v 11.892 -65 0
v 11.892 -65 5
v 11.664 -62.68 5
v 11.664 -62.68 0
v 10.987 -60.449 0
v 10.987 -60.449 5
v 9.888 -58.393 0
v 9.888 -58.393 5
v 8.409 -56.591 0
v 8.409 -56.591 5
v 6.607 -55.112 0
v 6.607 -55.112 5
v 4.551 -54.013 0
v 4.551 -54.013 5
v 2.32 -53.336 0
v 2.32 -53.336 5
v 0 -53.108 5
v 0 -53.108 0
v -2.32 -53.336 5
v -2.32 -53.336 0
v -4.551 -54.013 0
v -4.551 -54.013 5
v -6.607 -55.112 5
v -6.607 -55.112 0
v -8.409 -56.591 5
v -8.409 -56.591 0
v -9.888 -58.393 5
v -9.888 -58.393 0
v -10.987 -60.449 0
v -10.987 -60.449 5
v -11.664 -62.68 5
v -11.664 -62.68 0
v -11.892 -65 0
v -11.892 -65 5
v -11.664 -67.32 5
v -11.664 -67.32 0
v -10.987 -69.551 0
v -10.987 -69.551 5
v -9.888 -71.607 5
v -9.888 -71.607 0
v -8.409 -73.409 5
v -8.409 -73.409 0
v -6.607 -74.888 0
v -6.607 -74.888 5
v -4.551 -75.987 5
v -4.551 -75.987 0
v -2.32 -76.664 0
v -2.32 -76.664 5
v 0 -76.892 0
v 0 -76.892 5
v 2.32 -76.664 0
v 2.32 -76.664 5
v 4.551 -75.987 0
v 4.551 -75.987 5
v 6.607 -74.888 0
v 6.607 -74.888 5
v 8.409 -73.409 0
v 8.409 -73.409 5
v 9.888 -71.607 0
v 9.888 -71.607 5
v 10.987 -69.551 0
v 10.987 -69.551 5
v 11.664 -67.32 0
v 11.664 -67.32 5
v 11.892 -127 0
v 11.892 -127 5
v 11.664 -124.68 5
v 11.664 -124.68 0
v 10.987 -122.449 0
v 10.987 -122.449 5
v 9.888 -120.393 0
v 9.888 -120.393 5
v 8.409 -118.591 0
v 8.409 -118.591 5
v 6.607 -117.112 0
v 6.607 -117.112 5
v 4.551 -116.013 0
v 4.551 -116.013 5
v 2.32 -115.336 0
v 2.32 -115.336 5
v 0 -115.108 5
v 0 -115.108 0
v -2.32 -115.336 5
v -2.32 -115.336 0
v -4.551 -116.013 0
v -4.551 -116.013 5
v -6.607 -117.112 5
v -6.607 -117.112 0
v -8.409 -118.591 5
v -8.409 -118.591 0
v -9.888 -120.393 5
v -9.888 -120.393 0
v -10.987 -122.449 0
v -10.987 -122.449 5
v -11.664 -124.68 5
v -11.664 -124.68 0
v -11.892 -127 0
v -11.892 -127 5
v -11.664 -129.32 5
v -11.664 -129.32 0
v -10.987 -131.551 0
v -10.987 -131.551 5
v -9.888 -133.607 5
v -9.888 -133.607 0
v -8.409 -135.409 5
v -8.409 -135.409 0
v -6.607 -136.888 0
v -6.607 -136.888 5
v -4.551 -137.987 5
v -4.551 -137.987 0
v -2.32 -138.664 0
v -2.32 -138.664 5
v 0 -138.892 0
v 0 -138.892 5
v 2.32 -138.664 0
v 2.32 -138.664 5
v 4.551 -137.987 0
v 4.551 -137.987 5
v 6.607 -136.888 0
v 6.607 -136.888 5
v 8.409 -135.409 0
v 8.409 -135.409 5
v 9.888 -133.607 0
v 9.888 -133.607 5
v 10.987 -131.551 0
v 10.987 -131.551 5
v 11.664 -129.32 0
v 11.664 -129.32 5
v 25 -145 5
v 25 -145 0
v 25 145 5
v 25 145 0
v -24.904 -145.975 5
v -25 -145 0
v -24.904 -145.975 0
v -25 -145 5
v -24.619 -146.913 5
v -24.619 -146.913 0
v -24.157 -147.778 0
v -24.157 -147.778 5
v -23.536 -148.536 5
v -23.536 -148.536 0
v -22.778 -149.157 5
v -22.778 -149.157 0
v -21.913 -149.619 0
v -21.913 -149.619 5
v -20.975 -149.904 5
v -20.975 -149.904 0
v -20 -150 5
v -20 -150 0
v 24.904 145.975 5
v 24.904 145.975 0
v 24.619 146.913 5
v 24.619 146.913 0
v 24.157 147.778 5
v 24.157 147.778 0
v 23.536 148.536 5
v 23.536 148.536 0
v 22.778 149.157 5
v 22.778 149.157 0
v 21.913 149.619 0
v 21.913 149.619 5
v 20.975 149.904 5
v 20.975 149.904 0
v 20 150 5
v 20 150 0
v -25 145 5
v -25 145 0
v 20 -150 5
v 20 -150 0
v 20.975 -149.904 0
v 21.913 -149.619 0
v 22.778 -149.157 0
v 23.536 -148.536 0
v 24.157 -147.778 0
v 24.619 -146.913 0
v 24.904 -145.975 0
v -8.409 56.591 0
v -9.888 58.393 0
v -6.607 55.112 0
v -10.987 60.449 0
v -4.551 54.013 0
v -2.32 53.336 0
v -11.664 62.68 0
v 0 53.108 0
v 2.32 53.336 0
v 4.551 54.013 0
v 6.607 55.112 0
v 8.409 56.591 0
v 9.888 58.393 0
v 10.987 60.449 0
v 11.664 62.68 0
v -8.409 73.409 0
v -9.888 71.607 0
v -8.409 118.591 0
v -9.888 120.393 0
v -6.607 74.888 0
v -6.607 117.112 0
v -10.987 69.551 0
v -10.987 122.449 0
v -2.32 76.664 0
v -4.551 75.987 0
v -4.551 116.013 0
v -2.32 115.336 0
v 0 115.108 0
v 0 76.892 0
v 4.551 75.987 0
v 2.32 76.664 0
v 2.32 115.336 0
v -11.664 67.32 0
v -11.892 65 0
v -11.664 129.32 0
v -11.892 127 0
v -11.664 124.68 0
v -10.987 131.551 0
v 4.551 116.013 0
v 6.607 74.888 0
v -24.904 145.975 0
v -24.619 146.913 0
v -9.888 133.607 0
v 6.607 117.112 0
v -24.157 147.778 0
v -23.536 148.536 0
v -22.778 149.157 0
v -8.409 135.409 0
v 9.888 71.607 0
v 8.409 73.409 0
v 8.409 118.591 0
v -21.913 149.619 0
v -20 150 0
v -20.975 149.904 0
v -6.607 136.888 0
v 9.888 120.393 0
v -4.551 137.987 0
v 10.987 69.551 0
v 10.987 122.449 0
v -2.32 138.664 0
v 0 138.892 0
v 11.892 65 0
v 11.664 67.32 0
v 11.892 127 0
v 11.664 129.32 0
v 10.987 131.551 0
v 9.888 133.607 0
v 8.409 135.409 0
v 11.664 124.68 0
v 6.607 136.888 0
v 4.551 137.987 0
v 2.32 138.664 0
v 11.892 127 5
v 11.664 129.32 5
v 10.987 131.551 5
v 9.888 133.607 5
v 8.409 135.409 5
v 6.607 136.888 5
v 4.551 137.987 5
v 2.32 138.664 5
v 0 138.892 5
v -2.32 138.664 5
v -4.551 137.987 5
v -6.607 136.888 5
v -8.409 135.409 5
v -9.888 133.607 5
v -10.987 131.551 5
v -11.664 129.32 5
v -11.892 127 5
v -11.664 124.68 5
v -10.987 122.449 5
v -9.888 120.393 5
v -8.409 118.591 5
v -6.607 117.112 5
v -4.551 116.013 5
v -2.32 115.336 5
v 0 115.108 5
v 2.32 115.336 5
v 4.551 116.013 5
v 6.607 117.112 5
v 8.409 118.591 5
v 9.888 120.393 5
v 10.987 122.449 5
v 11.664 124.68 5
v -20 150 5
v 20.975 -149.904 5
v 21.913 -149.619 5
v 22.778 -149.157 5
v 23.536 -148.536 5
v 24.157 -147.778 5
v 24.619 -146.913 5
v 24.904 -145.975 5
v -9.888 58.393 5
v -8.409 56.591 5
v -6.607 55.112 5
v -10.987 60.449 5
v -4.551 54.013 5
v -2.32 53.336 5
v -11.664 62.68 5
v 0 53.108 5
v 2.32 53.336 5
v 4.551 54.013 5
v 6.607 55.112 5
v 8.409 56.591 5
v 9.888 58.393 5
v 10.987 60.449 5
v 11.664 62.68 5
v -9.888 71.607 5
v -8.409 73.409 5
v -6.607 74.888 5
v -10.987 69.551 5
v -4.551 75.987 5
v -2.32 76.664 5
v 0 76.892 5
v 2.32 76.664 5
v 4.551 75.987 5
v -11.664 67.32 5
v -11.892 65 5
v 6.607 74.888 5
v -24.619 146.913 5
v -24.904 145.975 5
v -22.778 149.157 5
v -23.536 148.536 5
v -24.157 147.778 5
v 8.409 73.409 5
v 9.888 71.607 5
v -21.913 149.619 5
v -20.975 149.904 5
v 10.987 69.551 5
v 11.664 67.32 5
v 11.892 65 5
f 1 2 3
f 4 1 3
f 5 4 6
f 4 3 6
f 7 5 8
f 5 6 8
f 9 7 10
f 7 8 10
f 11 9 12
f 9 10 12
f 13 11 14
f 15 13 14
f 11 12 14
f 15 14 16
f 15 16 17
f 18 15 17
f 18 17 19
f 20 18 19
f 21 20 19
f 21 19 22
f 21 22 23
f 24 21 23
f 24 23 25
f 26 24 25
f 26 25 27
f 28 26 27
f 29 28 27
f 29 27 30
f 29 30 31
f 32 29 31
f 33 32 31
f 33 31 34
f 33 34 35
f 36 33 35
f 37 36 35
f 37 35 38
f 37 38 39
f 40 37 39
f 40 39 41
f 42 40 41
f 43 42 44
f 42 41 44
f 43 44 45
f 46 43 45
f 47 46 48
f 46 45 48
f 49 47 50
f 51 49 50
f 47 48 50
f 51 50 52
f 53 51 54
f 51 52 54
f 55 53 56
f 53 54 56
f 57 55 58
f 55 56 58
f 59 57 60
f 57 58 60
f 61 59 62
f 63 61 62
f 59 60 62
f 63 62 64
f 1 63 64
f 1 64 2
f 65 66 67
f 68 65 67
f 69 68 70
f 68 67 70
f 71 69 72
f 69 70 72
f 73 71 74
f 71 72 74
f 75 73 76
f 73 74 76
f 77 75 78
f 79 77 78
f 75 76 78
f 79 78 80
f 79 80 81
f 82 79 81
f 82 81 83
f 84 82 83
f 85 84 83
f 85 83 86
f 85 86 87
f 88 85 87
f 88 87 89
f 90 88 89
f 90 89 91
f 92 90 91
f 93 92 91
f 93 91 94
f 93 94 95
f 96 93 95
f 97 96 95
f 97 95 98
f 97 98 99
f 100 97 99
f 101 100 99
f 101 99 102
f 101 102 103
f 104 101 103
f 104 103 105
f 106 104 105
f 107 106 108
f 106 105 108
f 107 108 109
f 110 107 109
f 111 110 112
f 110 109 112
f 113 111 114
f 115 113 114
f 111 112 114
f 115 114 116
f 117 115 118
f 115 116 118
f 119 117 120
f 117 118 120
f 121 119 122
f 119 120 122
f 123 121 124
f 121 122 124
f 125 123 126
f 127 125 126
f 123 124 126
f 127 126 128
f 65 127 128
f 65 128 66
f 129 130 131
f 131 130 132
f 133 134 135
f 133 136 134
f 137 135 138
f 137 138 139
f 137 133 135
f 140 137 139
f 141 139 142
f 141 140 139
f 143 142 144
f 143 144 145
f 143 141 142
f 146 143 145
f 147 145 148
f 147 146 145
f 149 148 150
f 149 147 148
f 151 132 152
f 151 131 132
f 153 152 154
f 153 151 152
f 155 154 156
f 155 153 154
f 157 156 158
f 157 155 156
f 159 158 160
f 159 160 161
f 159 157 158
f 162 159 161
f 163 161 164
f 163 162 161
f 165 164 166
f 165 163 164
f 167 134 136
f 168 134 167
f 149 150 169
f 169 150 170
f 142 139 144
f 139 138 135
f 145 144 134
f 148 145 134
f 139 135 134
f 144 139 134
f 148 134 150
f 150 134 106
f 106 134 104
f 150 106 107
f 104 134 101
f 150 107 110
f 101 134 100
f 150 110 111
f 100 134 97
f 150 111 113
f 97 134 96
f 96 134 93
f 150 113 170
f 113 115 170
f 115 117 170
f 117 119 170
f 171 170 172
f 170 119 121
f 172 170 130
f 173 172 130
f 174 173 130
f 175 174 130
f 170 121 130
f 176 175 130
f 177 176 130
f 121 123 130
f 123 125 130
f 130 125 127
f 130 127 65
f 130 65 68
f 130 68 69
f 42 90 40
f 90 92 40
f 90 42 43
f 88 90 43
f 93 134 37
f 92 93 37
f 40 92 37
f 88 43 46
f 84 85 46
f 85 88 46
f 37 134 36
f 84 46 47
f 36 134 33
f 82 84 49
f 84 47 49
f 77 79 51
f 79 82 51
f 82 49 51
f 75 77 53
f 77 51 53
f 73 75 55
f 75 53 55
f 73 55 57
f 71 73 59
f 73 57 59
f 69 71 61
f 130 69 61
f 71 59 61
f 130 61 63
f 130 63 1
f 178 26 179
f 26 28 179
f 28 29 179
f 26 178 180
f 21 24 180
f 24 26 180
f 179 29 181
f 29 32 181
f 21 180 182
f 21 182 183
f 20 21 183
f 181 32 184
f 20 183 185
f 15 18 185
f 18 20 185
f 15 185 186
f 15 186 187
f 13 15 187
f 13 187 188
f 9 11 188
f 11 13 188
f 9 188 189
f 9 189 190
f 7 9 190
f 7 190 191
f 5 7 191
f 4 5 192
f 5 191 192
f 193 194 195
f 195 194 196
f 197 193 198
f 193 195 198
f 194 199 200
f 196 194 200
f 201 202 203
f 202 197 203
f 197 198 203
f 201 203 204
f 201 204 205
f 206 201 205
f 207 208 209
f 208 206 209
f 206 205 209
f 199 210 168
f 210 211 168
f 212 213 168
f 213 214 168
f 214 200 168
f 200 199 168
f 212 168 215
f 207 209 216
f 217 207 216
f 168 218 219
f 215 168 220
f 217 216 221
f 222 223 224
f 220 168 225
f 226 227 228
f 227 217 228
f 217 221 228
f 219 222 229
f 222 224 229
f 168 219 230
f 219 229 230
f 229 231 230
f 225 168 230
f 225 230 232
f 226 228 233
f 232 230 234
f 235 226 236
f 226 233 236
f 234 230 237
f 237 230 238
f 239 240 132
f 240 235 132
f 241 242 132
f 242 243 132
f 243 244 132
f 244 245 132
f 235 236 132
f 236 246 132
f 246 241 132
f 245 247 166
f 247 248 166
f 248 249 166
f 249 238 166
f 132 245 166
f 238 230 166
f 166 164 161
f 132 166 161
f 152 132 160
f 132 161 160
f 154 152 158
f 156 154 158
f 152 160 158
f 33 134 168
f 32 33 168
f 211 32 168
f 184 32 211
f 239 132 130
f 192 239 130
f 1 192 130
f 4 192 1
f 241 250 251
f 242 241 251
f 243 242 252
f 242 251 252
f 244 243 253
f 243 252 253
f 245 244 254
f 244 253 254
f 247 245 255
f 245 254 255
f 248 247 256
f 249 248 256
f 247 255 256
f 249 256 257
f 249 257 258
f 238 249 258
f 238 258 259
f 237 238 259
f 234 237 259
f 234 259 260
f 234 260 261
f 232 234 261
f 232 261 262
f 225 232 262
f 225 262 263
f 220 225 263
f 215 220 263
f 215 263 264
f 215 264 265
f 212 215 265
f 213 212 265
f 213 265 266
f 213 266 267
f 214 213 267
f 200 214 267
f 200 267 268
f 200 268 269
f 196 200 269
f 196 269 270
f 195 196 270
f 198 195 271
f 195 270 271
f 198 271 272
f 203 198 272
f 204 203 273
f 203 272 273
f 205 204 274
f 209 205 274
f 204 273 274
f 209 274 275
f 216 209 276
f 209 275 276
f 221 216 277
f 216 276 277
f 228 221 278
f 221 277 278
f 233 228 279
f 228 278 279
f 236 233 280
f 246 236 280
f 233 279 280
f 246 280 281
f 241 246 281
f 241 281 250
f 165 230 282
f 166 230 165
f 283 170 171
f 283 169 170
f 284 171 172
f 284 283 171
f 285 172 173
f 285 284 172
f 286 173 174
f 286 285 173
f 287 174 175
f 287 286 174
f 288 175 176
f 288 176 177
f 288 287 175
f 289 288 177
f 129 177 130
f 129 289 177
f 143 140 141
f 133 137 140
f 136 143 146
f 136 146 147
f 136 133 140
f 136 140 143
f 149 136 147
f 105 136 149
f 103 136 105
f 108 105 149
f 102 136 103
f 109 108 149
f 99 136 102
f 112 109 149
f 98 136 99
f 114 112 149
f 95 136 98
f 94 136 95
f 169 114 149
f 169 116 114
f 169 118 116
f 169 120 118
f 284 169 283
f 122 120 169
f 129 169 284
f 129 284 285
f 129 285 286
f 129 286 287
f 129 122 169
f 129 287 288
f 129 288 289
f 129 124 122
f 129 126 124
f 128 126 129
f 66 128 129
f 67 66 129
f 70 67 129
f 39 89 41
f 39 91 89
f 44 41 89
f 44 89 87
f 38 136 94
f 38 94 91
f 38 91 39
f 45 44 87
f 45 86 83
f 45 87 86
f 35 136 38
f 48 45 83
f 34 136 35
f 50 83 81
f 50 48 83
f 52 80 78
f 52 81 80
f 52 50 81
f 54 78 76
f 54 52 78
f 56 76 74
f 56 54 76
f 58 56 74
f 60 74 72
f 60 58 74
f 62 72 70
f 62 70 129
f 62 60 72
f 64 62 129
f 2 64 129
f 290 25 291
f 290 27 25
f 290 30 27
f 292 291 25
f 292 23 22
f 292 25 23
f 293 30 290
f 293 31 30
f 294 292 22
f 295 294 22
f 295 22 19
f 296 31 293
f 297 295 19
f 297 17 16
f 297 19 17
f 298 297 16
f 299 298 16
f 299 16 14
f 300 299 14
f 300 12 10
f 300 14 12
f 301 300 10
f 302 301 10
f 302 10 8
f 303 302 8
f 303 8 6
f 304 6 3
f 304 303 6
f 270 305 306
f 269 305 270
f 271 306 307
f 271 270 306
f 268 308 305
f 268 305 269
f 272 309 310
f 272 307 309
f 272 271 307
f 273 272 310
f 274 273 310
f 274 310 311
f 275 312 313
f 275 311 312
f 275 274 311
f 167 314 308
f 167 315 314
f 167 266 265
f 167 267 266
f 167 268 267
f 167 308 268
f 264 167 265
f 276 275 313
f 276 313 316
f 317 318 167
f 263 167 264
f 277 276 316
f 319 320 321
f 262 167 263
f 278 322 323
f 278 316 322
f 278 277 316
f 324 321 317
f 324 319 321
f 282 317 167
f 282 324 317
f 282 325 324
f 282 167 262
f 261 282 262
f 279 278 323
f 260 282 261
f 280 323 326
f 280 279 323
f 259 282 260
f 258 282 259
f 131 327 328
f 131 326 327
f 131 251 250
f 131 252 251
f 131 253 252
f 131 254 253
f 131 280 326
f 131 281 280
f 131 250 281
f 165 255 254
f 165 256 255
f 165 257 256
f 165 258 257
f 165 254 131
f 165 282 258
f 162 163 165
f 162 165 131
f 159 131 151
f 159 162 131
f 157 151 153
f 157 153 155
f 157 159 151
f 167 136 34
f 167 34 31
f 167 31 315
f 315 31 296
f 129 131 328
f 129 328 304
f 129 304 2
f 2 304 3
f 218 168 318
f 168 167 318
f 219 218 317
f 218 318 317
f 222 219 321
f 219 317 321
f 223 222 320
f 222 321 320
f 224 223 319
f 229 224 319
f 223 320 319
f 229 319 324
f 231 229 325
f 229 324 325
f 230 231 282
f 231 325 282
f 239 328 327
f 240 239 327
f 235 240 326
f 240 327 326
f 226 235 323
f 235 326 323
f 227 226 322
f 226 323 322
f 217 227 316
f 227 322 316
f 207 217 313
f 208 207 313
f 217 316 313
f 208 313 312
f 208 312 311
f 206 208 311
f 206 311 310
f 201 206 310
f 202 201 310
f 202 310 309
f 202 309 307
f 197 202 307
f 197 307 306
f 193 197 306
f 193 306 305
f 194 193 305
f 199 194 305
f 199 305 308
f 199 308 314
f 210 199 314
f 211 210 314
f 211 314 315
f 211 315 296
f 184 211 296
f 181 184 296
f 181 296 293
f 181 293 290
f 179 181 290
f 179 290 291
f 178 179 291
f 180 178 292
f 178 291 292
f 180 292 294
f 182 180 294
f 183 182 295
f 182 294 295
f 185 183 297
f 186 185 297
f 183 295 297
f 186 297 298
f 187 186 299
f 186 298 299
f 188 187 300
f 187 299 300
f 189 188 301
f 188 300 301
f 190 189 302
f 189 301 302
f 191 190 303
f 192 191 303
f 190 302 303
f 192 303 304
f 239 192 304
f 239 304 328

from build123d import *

# Parameters (mm, degrees)
SKETCH1_W                                = 50
SKETCH1_H                                = 300
BOSS_EXTRUDE1_DEPTH                      = 5
FILLET3_R                                = 5
CBORE_FOR_M12_HEX_HEAD_BOLT1_D           = 13.5
CBORE_FOR_M12_HEX_HEAD_BOLT1_CBORE_D     = 23.785
CBORE_FOR_M12_HEX_HEAD_BOLT1_CBORE_DEPTH = 7.5


with BuildPart() as part:
    # Sketch1 → Boss-Extrude1 (new body)
    with BuildSketch(Plane.XY):
        Rectangle(SKETCH1_W, SKETCH1_H)
    extrude(amount=BOSS_EXTRUDE1_DEPTH)

    # Fillet3
    fillet3_edges = [part.edges().sort_by_distance(p)[0] for p in [
        (-25, 150, 2.5),
        (25, 150, 2.5),
        (25, -150, 2.5),
        (-25, -150, 2.5),
    ]]
    fillet(fillet3_edges, radius=FILLET3_R)

    # CBORE for M12 Hex Head Bolt1 (through all)
    with Locations(Plane.XY.offset(5)):
        with Locations((0, 127), (0, 65), (0, -65), (0, -127)):
            CounterBoreHole(CBORE_FOR_M12_HEX_HEAD_BOLT1_D / 2, CBORE_FOR_M12_HEX_HEAD_BOLT1_CBORE_D / 2, CBORE_FOR_M12_HEX_HEAD_BOLT1_CBORE_DEPTH)


solid = part.part
